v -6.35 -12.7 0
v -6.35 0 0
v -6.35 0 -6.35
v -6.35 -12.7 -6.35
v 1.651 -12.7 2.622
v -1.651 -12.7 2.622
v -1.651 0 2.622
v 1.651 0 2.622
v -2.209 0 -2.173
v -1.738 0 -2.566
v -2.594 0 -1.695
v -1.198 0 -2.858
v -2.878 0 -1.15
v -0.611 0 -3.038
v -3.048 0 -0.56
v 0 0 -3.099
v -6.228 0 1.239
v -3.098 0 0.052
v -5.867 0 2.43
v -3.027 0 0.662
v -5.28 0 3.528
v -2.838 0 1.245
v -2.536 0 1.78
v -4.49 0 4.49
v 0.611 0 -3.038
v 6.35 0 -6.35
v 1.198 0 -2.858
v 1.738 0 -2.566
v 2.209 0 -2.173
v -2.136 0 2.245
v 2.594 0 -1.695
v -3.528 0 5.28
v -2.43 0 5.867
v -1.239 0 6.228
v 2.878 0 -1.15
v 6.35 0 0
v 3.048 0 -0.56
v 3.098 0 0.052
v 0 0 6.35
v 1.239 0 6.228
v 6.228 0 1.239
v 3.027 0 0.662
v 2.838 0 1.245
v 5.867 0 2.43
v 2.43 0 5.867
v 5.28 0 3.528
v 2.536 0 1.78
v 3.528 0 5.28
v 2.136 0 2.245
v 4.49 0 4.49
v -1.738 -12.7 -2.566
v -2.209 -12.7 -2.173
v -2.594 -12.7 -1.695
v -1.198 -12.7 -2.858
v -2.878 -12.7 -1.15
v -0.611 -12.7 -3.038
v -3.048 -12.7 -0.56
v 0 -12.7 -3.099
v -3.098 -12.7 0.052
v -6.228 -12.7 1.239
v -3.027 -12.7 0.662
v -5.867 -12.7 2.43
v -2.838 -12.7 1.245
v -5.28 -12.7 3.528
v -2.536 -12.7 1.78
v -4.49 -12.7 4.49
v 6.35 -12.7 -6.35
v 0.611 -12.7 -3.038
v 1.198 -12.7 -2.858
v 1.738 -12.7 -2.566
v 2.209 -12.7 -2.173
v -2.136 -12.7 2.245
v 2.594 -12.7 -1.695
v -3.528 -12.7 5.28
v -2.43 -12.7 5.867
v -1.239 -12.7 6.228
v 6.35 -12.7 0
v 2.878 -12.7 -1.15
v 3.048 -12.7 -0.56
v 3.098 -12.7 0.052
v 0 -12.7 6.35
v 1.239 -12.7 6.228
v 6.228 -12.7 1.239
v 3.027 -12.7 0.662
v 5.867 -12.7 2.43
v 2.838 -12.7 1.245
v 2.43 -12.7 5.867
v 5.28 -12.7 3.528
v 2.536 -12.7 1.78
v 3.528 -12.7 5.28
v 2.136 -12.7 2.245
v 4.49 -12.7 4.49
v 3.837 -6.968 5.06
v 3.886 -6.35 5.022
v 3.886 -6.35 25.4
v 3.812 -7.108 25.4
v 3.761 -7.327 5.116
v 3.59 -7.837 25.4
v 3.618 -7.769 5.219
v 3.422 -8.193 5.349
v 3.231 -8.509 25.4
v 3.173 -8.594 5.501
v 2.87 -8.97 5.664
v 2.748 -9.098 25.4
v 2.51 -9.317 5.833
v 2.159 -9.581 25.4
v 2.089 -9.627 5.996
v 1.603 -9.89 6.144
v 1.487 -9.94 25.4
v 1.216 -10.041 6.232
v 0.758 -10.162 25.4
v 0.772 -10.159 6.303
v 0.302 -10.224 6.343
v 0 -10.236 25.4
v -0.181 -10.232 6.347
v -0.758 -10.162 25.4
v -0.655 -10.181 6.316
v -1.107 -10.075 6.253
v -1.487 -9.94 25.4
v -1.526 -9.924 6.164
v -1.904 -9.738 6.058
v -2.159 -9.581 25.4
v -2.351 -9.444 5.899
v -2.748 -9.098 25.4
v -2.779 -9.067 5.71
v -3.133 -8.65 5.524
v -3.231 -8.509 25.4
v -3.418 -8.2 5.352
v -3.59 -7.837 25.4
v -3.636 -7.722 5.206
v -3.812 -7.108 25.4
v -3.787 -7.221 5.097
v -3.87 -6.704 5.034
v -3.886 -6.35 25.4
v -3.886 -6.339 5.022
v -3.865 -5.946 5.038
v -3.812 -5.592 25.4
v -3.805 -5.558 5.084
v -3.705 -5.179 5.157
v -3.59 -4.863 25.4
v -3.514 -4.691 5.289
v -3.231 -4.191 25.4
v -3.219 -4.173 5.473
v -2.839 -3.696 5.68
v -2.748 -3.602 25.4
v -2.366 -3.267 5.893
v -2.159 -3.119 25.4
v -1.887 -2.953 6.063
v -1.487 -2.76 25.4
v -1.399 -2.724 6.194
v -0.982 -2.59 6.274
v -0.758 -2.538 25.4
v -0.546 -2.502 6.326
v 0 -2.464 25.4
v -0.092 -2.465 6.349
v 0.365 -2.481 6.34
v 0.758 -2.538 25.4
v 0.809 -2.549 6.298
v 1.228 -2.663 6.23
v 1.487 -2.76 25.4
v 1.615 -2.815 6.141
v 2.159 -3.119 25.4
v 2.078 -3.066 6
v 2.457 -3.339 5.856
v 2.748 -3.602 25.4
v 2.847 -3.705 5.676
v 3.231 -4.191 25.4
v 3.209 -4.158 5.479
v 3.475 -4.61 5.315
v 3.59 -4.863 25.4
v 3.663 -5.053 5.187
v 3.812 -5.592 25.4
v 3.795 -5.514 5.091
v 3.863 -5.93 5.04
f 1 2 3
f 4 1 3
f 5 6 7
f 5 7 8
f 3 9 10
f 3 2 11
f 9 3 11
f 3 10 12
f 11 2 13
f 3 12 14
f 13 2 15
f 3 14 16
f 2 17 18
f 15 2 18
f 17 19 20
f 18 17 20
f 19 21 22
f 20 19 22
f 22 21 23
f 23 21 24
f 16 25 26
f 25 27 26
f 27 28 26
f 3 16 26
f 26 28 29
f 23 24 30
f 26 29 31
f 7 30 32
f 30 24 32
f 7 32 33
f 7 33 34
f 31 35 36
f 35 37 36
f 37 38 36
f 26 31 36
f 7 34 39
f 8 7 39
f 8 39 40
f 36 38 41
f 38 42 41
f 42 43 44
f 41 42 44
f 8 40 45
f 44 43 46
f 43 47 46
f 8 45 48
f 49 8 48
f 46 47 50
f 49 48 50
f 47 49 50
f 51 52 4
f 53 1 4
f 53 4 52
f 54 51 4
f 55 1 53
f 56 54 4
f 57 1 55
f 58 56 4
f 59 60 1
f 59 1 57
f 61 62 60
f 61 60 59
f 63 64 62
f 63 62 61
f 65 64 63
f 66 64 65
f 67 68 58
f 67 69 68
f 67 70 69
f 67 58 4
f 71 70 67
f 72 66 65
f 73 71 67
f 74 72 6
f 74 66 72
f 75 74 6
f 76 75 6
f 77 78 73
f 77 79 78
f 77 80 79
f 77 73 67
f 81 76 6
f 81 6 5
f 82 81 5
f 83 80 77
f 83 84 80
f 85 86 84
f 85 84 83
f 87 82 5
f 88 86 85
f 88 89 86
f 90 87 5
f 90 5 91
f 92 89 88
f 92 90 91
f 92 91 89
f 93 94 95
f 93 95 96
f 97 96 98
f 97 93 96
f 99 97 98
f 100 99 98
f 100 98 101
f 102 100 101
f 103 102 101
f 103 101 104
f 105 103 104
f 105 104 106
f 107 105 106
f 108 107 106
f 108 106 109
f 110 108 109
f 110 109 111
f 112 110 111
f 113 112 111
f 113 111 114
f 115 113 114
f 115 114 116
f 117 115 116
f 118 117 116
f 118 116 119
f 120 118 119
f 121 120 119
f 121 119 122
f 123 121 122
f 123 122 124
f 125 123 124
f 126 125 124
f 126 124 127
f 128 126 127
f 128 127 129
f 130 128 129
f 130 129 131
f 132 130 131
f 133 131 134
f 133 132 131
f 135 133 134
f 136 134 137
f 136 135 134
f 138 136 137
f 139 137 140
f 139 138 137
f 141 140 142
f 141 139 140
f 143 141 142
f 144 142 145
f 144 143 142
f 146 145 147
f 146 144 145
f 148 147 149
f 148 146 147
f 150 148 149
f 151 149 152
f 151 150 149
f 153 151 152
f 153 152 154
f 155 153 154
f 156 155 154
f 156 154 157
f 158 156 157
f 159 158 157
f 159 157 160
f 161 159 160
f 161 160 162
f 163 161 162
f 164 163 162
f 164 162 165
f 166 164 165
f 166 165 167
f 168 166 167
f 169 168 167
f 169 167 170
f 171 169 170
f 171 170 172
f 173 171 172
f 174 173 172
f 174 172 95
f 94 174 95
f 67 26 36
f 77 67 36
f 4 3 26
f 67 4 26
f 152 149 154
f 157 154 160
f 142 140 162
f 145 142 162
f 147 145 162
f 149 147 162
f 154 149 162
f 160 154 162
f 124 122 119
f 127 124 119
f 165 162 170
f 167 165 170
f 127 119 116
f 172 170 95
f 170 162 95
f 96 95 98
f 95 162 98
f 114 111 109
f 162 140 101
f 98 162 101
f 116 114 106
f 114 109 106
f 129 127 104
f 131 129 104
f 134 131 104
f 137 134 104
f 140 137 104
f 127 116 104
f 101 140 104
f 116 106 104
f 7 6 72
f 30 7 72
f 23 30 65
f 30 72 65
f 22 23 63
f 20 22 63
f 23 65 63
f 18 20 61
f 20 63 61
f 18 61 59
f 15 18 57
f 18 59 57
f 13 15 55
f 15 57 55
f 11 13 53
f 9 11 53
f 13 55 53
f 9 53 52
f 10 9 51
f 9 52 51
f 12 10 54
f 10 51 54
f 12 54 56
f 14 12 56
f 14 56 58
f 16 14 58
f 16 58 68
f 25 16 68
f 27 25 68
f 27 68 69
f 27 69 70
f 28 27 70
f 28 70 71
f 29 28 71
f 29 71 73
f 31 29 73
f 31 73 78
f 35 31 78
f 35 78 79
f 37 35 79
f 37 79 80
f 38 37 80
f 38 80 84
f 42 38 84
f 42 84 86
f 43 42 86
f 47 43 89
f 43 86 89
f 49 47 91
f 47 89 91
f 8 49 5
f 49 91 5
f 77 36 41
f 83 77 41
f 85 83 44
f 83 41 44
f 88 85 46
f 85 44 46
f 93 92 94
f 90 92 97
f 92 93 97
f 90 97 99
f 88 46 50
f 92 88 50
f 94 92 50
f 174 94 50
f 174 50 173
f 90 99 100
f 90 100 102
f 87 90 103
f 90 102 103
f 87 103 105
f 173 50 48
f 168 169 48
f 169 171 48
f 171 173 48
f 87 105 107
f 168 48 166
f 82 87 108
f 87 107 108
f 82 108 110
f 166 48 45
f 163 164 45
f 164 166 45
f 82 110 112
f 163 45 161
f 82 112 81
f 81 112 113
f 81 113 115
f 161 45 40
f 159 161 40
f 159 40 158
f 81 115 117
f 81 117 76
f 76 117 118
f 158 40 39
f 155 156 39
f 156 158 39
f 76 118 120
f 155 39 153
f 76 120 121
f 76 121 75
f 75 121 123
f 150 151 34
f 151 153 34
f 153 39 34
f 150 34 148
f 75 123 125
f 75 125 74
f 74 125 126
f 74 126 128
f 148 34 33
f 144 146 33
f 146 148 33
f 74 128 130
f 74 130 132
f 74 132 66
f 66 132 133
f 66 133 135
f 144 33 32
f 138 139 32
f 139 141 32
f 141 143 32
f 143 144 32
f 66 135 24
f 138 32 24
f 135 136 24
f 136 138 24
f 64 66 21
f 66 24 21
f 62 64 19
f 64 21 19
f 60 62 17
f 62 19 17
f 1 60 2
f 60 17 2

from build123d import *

# Parameters (mm, degrees)
PAD015_DEPTH    = 12.7
SKETCH033_R     = 3.8862
PAD016_DEPTH    = 25.4
POCKET016_DEPTH = 12.701


with BuildPart() as part:
    # Sketch032 → Pad015 (new body)
    with BuildSketch(Plane.XZ):
        with BuildLine():
            ThreePointArc((6.35, 0), (0, 6.35), (-6.35, 0))
            Line((-6.35, 0), (-6.35, -6.35))
            Line((-6.35, -6.35), (6.35, -6.35))
            Line((6.35, -6.35), (6.35, 0))
        make_face()
    extrude(amount=PAD015_DEPTH)

    # Sketch033 (on DatumPlane) → Pad016 (join)
    with BuildSketch(Plane(origin=(0, 0, 0), x_dir=(1, 0, 0), z_dir=(0, 0, -1))):
        with Locations((0, 6.35)):
            Circle(SKETCH033_R)
    extrude(amount=-PAD016_DEPTH)

    # Sketch034 (on Face4 of Pad016) → Pocket016 (cut, through all)
    with BuildSketch(Plane.XZ.offset(12.7)):
        with BuildLine():
            ThreePointArc((-1.651, 2.622358), (0, -3.0988), (1.651, 2.622358))
            Line((-1.651, 2.622358), (1.651, 2.622358))
        make_face()
    extrude(amount=-POCKET016_DEPTH, mode=Mode.SUBTRACT)


solid = part.part
